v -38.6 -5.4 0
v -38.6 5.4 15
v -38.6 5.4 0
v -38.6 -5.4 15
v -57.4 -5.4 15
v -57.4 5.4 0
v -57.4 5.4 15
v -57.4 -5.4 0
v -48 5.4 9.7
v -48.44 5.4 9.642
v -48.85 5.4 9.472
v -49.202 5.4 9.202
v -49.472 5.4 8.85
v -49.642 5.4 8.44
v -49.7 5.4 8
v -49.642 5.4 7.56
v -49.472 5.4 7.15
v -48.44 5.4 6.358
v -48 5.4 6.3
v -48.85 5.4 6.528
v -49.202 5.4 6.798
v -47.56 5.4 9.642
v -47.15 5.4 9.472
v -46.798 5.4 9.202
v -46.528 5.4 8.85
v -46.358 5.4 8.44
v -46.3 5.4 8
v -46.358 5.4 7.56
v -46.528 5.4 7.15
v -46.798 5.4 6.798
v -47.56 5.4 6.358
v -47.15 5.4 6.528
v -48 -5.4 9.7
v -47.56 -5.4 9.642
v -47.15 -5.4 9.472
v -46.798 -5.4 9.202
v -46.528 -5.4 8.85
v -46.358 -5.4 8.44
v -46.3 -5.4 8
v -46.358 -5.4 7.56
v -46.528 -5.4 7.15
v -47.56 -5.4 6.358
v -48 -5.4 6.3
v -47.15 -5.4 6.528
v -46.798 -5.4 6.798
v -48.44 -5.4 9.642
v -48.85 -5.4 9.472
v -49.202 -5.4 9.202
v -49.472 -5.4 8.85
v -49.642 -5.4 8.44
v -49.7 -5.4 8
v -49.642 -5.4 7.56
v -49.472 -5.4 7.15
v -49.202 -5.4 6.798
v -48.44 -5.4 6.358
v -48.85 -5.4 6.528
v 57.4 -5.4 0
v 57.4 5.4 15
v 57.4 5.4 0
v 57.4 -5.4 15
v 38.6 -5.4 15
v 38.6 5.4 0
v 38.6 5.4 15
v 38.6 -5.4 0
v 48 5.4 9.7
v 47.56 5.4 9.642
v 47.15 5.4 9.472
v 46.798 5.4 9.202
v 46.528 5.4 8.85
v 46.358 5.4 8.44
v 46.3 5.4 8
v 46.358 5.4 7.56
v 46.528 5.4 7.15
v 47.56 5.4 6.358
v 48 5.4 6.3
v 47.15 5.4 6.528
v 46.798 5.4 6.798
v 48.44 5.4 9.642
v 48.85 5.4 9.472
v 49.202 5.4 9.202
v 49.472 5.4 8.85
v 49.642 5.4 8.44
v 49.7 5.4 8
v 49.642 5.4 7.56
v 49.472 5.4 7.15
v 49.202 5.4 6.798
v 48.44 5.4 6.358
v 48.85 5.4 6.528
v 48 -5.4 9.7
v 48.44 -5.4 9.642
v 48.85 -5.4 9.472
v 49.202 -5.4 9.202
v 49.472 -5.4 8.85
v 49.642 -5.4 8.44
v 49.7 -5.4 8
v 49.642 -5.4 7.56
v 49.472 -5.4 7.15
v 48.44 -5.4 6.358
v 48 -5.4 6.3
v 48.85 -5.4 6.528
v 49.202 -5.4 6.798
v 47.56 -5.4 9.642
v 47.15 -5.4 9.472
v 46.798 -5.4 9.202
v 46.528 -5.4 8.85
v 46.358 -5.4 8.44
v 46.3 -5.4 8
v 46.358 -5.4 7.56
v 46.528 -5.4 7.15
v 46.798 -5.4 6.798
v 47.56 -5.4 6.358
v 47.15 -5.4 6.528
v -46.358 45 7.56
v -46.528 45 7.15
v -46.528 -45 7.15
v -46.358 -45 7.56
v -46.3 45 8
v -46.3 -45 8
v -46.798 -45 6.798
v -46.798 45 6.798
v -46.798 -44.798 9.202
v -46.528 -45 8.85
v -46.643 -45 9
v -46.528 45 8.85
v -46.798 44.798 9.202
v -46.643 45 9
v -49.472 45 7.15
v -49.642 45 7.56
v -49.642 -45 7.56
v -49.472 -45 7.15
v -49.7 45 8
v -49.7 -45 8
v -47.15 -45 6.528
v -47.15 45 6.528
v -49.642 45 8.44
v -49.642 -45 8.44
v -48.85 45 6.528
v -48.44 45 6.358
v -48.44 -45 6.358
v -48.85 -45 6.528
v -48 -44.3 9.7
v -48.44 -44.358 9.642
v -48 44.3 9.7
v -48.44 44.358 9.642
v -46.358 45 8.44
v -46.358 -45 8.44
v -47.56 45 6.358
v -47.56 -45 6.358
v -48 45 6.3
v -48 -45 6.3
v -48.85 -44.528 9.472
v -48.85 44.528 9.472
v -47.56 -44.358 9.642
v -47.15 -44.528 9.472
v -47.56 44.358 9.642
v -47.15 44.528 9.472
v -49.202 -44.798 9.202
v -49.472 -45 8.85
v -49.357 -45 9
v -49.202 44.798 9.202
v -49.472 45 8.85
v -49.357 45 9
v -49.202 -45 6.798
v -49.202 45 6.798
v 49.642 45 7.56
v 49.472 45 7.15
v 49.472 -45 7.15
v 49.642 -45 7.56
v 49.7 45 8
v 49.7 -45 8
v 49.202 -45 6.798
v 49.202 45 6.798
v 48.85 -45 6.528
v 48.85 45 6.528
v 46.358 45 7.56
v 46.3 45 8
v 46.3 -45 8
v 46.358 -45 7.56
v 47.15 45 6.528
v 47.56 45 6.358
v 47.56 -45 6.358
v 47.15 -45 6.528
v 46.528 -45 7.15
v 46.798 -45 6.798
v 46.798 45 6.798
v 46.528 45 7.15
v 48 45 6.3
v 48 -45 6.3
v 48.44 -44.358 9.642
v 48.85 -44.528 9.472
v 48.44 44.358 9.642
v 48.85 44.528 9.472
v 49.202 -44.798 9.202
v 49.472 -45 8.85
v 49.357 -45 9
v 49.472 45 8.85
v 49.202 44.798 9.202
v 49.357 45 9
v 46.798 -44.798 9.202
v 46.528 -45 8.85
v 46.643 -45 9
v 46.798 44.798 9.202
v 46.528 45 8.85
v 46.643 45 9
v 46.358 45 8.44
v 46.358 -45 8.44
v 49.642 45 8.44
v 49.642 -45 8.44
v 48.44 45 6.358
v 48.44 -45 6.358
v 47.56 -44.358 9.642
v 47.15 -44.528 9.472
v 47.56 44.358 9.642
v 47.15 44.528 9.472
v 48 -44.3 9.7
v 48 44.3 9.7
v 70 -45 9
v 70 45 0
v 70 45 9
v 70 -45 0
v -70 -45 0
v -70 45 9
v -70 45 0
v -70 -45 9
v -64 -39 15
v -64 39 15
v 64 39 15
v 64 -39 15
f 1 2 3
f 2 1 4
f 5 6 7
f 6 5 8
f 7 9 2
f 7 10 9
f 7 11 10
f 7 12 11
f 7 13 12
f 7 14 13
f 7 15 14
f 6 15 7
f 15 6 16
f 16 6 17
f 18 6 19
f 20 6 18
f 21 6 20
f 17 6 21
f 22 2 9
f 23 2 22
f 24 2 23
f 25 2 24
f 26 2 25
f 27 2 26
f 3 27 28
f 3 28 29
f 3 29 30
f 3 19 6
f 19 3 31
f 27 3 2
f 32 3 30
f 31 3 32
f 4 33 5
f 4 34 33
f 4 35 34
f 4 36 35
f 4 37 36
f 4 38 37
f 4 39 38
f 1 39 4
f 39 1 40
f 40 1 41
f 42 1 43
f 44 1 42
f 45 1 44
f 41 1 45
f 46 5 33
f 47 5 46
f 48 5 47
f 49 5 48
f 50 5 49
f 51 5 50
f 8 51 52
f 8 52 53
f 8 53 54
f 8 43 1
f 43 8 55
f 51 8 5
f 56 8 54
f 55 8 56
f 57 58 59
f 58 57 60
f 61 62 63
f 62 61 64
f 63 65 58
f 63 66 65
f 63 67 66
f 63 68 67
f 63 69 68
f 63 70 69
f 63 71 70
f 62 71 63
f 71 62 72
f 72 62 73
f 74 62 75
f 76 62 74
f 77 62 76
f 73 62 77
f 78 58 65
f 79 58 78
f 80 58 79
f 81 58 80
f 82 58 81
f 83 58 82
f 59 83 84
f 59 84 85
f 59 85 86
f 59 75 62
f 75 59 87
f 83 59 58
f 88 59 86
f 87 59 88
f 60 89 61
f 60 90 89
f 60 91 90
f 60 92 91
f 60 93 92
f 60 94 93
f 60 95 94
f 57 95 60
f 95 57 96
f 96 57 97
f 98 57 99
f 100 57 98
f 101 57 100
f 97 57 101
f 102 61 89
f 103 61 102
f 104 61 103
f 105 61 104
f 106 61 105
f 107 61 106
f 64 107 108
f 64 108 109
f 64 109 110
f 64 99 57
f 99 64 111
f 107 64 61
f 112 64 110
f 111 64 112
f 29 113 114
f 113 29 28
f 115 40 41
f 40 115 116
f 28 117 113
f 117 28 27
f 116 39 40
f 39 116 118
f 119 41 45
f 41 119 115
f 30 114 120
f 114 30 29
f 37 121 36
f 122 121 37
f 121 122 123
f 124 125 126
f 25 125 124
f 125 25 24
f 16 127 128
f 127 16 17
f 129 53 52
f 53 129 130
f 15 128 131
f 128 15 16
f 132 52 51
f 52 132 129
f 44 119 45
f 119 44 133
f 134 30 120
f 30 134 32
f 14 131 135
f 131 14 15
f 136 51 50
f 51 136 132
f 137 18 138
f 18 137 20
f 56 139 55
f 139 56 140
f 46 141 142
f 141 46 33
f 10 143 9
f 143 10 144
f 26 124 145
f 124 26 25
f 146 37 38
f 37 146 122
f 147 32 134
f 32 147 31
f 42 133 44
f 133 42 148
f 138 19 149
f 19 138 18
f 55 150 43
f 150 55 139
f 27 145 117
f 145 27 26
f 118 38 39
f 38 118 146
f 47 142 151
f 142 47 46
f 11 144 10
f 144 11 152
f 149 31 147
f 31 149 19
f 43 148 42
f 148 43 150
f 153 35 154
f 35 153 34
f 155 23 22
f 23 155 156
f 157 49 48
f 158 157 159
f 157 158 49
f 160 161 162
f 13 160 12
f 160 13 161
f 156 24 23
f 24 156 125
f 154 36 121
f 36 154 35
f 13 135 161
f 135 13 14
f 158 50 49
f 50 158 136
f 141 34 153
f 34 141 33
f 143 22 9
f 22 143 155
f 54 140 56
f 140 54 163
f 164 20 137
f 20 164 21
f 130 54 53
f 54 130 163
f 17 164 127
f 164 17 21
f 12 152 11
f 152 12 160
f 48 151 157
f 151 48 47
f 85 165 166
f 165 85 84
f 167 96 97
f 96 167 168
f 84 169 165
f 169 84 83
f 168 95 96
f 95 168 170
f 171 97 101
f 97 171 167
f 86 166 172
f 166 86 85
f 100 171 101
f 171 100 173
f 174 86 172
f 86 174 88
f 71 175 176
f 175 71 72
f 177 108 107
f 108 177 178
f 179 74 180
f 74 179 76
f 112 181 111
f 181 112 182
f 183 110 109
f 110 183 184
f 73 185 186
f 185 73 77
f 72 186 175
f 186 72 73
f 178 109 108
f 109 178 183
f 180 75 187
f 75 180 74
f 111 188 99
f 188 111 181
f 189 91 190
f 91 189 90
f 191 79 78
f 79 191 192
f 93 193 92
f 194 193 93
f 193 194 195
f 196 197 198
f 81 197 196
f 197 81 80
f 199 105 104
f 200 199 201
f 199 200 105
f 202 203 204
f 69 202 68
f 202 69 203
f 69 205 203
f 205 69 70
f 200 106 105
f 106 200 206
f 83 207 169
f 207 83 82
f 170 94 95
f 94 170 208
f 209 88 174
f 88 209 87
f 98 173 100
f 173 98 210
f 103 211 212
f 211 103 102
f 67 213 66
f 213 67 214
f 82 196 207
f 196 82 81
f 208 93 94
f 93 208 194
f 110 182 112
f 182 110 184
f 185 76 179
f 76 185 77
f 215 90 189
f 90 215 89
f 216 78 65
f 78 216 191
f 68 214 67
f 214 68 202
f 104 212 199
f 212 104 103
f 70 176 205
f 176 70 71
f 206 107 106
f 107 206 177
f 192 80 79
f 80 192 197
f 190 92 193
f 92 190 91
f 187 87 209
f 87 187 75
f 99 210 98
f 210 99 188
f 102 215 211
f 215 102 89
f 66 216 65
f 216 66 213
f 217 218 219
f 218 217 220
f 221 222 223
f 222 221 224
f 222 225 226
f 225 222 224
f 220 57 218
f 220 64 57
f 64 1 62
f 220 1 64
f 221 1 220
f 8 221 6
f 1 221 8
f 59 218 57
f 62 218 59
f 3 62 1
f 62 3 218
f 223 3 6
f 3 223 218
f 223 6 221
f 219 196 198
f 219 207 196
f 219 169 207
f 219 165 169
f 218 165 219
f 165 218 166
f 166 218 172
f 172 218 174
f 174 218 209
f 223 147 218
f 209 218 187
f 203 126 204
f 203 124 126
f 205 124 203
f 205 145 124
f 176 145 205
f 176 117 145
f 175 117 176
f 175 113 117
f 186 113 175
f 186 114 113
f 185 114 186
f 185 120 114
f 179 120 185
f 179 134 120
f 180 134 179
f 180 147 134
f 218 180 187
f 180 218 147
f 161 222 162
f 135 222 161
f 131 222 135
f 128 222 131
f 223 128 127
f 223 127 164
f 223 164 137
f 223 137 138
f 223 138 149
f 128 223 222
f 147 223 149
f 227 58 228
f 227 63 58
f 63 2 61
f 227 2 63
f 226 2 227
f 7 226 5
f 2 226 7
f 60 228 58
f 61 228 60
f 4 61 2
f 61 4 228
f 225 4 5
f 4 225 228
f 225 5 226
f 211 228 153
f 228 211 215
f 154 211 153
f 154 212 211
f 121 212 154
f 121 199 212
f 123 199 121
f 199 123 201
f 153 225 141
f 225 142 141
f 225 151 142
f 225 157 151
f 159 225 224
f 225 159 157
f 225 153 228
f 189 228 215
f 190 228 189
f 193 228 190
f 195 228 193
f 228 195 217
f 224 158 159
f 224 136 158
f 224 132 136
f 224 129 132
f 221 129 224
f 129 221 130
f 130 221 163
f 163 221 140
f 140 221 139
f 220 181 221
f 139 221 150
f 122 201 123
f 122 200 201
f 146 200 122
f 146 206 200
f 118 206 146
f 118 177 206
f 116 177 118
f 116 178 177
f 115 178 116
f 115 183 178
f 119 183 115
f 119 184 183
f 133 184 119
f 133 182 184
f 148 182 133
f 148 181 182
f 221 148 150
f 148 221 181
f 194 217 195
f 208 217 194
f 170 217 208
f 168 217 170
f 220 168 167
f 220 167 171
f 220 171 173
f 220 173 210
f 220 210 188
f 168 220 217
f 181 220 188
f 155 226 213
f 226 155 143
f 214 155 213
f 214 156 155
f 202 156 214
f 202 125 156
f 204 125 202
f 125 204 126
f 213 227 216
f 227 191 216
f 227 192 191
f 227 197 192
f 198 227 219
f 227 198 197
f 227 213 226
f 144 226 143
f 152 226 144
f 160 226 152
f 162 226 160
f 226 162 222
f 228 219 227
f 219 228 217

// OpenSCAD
// ferris/base_mini.scad (7/23)
// Minimal foot pad replacing the full 250x183 base boards - one pad per
// tower, print x2. Keeps the same slot geometry (tower foot tabs at +/-48,
// thumbscrew holes) but shrinks the footprint to ~1/3 -> big print-time cut.
// The crank-side journal bracket is dropped (shaft rides in the two tower
// bores; the hand crank is fine cantilevered).

include <../params.scad>;

pad_x   = 140;                 // spans both feet (centres +/-48, foot 26 wide)
pad_y   = 90;                  // anti-tip depth (tower frame is only 30 deep)
pad_t   = base_t;              // 15: full slot depth like the original
cham    = 6;                   // top edge chamfer, saves a little material

module base_mini() {
    difference() {
        // chamfered slab
        hull() {
            translate([-pad_x/2, -pad_y/2, 0]) cube([pad_x, pad_y, pad_t - cham]);
            translate([-pad_x/2 + cham, -pad_y/2 + cham, 0])
                cube([pad_x - 2*cham, pad_y - 2*cham, pad_t]);
        }
        // two tower-foot slots (same layout as base.scad)
        for (sx = [-1, 1])
            translate([sx * 48 - base_slot_w/2, -base_slot_t/2, pad_t - base_slot_d + 0.01])
                cube([base_slot_w, base_slot_t, base_slot_d]);
        // horizontal M3 thumbscrew holes through the slot walls (tower foot
        // thumb holes sit 8 up from the tab bottom -> z = pad_t - 15 + 8)
        for (sx = [-1, 1])
            translate([sx * 48, -pad_y/2 - 1, pad_t - foot_tab_h + 8])
                rotate([-90, 0, 0]) cylinder(d = m3_clear, h = pad_y + 2, $fn = 24);
    }
}

base_mini();
